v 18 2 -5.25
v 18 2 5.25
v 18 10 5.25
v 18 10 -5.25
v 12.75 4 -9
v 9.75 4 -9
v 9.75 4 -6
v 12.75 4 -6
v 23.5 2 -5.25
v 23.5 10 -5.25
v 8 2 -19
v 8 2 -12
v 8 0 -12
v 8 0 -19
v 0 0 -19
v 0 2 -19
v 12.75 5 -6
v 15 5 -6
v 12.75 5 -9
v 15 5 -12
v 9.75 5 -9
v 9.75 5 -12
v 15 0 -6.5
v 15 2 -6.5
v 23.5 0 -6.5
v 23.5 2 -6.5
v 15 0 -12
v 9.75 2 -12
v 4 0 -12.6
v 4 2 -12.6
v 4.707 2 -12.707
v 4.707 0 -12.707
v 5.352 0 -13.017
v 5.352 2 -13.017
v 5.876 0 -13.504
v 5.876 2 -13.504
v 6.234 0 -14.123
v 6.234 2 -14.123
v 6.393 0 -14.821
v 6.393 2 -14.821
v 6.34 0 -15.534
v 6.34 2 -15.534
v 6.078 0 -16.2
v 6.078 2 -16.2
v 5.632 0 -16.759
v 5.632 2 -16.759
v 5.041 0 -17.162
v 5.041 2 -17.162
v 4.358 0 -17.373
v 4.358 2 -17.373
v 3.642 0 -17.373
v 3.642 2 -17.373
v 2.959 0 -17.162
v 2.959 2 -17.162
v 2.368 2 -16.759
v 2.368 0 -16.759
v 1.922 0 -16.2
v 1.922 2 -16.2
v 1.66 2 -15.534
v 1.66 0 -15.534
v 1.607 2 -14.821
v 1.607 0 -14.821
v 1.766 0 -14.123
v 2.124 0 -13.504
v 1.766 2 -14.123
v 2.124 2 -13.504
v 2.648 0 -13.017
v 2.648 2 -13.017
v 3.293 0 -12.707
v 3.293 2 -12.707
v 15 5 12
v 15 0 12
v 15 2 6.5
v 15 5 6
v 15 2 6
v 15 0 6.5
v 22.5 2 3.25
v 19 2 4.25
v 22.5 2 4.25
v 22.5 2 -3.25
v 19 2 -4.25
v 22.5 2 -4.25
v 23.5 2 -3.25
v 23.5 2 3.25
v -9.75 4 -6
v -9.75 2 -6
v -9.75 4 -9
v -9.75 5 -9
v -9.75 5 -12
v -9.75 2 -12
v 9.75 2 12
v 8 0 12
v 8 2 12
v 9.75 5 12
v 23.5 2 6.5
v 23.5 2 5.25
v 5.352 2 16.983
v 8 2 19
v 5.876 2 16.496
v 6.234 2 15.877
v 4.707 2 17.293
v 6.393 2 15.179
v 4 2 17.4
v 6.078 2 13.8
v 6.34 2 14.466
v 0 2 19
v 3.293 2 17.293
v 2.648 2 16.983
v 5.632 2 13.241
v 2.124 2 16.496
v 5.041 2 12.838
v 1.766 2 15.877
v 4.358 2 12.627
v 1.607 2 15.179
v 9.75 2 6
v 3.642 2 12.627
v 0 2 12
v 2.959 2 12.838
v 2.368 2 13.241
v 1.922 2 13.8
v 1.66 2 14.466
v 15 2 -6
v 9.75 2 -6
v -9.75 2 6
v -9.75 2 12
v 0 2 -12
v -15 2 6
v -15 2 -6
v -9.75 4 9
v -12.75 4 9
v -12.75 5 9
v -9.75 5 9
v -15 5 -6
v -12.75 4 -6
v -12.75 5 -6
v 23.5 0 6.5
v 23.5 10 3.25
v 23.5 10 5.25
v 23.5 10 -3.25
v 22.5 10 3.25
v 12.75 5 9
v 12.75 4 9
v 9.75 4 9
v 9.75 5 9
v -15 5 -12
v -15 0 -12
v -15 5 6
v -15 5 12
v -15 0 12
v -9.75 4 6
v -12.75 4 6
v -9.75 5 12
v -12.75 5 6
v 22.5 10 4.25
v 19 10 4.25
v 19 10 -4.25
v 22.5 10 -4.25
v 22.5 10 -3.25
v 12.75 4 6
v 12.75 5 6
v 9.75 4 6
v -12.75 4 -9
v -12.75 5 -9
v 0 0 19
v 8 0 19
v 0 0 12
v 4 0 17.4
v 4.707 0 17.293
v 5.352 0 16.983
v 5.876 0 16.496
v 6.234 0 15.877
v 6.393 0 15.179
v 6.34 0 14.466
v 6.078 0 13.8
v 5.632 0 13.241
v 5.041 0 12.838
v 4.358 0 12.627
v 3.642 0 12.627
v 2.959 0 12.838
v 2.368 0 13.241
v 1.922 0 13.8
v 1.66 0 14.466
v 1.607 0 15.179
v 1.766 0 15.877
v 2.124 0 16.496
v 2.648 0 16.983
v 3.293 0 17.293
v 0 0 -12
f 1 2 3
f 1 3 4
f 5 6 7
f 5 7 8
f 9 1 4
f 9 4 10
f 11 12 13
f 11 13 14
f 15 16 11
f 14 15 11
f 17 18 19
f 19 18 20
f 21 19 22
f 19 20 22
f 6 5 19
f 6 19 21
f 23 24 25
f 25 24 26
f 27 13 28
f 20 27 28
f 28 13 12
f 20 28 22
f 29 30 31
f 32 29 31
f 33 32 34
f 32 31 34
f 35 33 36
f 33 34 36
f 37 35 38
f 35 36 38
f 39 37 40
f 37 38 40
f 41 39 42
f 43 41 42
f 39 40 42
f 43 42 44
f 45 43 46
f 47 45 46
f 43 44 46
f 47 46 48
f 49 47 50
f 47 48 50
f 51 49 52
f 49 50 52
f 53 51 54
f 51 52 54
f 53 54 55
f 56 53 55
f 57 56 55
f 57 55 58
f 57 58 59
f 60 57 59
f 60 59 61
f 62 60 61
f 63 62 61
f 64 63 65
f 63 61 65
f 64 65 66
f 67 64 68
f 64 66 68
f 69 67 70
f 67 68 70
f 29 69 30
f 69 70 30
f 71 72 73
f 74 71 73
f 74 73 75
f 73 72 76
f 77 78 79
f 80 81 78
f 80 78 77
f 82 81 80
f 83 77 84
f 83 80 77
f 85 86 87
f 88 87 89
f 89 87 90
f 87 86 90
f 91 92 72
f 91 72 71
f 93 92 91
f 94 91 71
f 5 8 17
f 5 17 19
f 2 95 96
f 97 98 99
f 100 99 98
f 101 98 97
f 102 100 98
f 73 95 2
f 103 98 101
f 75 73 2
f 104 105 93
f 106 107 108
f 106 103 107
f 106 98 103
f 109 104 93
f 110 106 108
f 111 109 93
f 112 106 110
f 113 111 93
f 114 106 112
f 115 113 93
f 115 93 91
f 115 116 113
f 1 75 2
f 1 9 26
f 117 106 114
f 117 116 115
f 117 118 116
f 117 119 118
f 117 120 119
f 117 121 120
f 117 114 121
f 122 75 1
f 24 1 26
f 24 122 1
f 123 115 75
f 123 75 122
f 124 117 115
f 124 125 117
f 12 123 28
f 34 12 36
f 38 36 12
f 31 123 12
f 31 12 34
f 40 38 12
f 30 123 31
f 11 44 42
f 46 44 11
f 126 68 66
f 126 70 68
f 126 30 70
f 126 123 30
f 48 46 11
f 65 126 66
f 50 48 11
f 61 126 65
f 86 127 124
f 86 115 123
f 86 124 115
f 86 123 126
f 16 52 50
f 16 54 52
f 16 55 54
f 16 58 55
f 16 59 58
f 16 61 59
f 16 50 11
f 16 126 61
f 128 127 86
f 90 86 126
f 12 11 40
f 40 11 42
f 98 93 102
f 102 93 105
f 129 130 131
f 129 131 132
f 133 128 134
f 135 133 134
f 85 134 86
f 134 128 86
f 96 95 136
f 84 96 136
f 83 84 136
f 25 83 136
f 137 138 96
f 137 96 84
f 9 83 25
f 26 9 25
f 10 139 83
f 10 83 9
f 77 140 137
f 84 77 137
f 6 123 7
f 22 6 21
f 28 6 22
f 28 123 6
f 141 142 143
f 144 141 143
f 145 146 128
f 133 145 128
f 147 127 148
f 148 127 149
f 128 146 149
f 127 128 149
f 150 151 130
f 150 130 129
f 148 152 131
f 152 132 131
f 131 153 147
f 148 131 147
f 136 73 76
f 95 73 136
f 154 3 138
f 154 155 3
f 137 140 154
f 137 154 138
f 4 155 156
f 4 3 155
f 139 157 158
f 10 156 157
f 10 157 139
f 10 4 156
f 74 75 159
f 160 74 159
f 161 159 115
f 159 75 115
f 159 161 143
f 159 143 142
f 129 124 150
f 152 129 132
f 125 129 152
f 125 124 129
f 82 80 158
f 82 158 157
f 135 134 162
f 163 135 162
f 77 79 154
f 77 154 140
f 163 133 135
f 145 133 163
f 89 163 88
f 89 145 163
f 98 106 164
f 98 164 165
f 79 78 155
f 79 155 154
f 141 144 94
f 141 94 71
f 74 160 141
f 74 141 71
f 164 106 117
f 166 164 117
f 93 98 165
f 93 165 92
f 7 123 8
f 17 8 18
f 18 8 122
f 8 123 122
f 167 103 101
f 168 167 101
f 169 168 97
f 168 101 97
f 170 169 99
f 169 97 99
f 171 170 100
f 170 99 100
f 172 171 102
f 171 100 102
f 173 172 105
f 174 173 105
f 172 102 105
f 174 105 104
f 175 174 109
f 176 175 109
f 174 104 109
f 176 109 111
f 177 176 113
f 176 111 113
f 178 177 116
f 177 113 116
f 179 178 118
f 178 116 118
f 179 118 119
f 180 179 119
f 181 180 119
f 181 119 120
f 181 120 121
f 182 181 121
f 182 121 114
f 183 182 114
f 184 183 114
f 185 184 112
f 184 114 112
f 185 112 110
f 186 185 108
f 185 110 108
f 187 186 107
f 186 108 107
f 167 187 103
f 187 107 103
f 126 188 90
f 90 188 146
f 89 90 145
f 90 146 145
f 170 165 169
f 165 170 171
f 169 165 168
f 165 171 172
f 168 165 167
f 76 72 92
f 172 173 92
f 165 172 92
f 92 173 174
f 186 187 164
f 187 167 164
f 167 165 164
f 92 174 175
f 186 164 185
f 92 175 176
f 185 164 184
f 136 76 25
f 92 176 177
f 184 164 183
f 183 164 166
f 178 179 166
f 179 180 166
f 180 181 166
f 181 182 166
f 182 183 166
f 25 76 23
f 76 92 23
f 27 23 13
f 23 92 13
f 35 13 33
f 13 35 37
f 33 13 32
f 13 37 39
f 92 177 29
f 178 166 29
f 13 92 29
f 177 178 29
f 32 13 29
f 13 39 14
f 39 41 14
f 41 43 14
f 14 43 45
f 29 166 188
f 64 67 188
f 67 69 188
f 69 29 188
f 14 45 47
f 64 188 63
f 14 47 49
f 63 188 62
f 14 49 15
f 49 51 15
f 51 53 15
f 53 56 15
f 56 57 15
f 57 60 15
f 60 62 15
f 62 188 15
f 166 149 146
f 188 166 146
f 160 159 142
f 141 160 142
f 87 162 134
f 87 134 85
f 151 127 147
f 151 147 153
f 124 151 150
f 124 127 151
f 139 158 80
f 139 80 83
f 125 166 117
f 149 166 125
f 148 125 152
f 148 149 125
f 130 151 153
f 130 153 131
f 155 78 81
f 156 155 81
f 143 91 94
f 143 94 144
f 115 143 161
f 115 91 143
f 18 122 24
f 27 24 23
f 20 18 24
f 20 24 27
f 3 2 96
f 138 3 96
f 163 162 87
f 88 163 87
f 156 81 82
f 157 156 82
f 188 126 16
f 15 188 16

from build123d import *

# Parameters (mm, degrees)
SKETCH_1_W          = 30
SKETCH_1_H          = 24
EXTRUDE_1_DEPTH     = 2
EXTRUDE_2_DEPTH     = 3
SKETCH_3_W          = 3
SKETCH_3_H          = 3
EXTRUDE_3_DEPTH     = 2
SKETCH_4_W          = 24
SKETCH_4_H          = 2
EXTRUDE_4_DEPTH     = 8.5
SKETCH_5_W          = 5.5
SKETCH_5_H          = 10.5
SKETCH_5_W_2        = 3.5
SKETCH_5_H_2        = 8.5
EXTRUDE_5_DEPTH     = 8
SKETCH_6_W          = 1
SKETCH_6_H          = 6.5
CUT_EXTRUDE_1_DEPTH = 8
SKETCH_7_W          = 8.5
SKETCH_7_H          = 5.5
CUT_EXTRUDE_2_DEPTH = 9
SKETCH_8_W          = 8
SKETCH_8_H          = 7
SKETCH_8_R          = 2.4
EXTRUDE_6_DEPTH     = 2


with BuildPart() as part:
    # 草图1 → 凸台-拉伸1 (new body)
    with BuildSketch(Plane(origin=(0, 0, 0), x_dir=(1, 0, 0), z_dir=(0, 1, 0))):
        Rectangle(SKETCH_1_W, SKETCH_1_H)
    extrude(amount=EXTRUDE_1_DEPTH)

    # 草图2 → 凸台-拉伸2 (add)
    with BuildSketch(Plane(origin=(0, 2, 0), x_dir=(1, 0, 0), z_dir=(0, 1, 0))):
        Polygon((-15, 12), (-15, 6), (-12.75, 6), (-12.75, 9), (-9.75, 9), (-9.75, 12), align=None)
        Polygon((9.75, 12), (15, 12), (15, 6), (12.75, 6), (12.75, 9), (9.75, 9), align=None)
        Polygon((15, -12), (15, -6), (12.75, -6), (12.75, -9), (9.75, -9), (9.75, -12), align=None)
        Polygon((-9.75, -12), (-15, -12), (-15, -6), (-12.75, -6), (-12.75, -9), (-9.75, -9), align=None)
    extrude(amount=EXTRUDE_2_DEPTH)

    # 草图3 → 凸台-拉伸3 (add)
    with BuildSketch(Plane(origin=(0, 2, 0), x_dir=(1, 0, 0), z_dir=(0, 1, 0))):
        with Locations((-11.25, 7.5)):
            Rectangle(SKETCH_3_W, SKETCH_3_H)
        with Locations((11.25, 7.5)):
            Rectangle(SKETCH_3_W, SKETCH_3_H)
        with Locations((11.25, -7.5)):
            Rectangle(SKETCH_3_W, SKETCH_3_H)
        with Locations((-11.25, -7.5)):
            Rectangle(SKETCH_3_W, SKETCH_3_H)
    extrude(amount=EXTRUDE_3_DEPTH)

    # 草图4 → 凸台-拉伸4 (add)
    with BuildSketch(Plane(origin=(15, 0, 0), x_dir=(0, 0, -1), z_dir=(1, 0, 0))):
        with Locations((0, 1)):
            Rectangle(SKETCH_4_W, SKETCH_4_H)
    extrude(amount=EXTRUDE_4_DEPTH)

    # 草图5 → 凸台-拉伸5 (add)
    with BuildSketch(Plane(origin=(0, 2, 0), x_dir=(1, 0, 0), z_dir=(0, 1, 0))):
        with Locations((20.75, 0)):
            Rectangle(SKETCH_5_W, SKETCH_5_H)
        with Locations((20.75, 0)):
            Rectangle(SKETCH_5_W_2, SKETCH_5_H_2, mode=Mode.SUBTRACT)
    extrude(amount=EXTRUDE_5_DEPTH)

    # 草图6 → 切除-拉伸1 (cut)
    with BuildSketch(Plane(origin=(0, 10, 0), x_dir=(1, 0, 0), z_dir=(0, 1, 0))):
        with Locations((23, 0)):
            Rectangle(SKETCH_6_W, SKETCH_6_H)
    extrude(amount=-CUT_EXTRUDE_1_DEPTH, mode=Mode.SUBTRACT)

    # 草图7 → 切除-拉伸2 (cut)
    with BuildSketch(Plane(origin=(0, 2, 0), x_dir=(1, 0, 0), z_dir=(0, 1, 0))):
        with Locations((19.25, 9.25)):
            Rectangle(SKETCH_7_W, SKETCH_7_H)
        with Locations((19.25, -9.25)):
            Rectangle(SKETCH_7_W, SKETCH_7_H)
    extrude(amount=-CUT_EXTRUDE_2_DEPTH, mode=Mode.SUBTRACT)

    # 草图8 → 凸台-拉伸6 (add)
    # profile 1 of 2: a face of its own
    with BuildSketch(Plane(origin=(0, 2, 0), x_dir=(1, 0, 0), z_dir=(0, 1, 0))):
        with Locations((4, -15.5)):
            Rectangle(SKETCH_8_W, SKETCH_8_H)
        with Locations(Location((4, -15, 0), (0, 0, 270))):
            Circle(SKETCH_8_R, mode=Mode.SUBTRACT)
    # profile 2 of 2: a face of its own
    with BuildSketch(Plane(origin=(0, 2, 0), x_dir=(1, 0, 0), z_dir=(0, 1, 0))):
        with Locations((4, 15.5)):
            Rectangle(SKETCH_8_W, SKETCH_8_H)
        with Locations(Location((4, 15, 0), (0, 0, 270))):
            Circle(SKETCH_8_R, mode=Mode.SUBTRACT)
    extrude(amount=-EXTRUDE_6_DEPTH)


solid = part.part
